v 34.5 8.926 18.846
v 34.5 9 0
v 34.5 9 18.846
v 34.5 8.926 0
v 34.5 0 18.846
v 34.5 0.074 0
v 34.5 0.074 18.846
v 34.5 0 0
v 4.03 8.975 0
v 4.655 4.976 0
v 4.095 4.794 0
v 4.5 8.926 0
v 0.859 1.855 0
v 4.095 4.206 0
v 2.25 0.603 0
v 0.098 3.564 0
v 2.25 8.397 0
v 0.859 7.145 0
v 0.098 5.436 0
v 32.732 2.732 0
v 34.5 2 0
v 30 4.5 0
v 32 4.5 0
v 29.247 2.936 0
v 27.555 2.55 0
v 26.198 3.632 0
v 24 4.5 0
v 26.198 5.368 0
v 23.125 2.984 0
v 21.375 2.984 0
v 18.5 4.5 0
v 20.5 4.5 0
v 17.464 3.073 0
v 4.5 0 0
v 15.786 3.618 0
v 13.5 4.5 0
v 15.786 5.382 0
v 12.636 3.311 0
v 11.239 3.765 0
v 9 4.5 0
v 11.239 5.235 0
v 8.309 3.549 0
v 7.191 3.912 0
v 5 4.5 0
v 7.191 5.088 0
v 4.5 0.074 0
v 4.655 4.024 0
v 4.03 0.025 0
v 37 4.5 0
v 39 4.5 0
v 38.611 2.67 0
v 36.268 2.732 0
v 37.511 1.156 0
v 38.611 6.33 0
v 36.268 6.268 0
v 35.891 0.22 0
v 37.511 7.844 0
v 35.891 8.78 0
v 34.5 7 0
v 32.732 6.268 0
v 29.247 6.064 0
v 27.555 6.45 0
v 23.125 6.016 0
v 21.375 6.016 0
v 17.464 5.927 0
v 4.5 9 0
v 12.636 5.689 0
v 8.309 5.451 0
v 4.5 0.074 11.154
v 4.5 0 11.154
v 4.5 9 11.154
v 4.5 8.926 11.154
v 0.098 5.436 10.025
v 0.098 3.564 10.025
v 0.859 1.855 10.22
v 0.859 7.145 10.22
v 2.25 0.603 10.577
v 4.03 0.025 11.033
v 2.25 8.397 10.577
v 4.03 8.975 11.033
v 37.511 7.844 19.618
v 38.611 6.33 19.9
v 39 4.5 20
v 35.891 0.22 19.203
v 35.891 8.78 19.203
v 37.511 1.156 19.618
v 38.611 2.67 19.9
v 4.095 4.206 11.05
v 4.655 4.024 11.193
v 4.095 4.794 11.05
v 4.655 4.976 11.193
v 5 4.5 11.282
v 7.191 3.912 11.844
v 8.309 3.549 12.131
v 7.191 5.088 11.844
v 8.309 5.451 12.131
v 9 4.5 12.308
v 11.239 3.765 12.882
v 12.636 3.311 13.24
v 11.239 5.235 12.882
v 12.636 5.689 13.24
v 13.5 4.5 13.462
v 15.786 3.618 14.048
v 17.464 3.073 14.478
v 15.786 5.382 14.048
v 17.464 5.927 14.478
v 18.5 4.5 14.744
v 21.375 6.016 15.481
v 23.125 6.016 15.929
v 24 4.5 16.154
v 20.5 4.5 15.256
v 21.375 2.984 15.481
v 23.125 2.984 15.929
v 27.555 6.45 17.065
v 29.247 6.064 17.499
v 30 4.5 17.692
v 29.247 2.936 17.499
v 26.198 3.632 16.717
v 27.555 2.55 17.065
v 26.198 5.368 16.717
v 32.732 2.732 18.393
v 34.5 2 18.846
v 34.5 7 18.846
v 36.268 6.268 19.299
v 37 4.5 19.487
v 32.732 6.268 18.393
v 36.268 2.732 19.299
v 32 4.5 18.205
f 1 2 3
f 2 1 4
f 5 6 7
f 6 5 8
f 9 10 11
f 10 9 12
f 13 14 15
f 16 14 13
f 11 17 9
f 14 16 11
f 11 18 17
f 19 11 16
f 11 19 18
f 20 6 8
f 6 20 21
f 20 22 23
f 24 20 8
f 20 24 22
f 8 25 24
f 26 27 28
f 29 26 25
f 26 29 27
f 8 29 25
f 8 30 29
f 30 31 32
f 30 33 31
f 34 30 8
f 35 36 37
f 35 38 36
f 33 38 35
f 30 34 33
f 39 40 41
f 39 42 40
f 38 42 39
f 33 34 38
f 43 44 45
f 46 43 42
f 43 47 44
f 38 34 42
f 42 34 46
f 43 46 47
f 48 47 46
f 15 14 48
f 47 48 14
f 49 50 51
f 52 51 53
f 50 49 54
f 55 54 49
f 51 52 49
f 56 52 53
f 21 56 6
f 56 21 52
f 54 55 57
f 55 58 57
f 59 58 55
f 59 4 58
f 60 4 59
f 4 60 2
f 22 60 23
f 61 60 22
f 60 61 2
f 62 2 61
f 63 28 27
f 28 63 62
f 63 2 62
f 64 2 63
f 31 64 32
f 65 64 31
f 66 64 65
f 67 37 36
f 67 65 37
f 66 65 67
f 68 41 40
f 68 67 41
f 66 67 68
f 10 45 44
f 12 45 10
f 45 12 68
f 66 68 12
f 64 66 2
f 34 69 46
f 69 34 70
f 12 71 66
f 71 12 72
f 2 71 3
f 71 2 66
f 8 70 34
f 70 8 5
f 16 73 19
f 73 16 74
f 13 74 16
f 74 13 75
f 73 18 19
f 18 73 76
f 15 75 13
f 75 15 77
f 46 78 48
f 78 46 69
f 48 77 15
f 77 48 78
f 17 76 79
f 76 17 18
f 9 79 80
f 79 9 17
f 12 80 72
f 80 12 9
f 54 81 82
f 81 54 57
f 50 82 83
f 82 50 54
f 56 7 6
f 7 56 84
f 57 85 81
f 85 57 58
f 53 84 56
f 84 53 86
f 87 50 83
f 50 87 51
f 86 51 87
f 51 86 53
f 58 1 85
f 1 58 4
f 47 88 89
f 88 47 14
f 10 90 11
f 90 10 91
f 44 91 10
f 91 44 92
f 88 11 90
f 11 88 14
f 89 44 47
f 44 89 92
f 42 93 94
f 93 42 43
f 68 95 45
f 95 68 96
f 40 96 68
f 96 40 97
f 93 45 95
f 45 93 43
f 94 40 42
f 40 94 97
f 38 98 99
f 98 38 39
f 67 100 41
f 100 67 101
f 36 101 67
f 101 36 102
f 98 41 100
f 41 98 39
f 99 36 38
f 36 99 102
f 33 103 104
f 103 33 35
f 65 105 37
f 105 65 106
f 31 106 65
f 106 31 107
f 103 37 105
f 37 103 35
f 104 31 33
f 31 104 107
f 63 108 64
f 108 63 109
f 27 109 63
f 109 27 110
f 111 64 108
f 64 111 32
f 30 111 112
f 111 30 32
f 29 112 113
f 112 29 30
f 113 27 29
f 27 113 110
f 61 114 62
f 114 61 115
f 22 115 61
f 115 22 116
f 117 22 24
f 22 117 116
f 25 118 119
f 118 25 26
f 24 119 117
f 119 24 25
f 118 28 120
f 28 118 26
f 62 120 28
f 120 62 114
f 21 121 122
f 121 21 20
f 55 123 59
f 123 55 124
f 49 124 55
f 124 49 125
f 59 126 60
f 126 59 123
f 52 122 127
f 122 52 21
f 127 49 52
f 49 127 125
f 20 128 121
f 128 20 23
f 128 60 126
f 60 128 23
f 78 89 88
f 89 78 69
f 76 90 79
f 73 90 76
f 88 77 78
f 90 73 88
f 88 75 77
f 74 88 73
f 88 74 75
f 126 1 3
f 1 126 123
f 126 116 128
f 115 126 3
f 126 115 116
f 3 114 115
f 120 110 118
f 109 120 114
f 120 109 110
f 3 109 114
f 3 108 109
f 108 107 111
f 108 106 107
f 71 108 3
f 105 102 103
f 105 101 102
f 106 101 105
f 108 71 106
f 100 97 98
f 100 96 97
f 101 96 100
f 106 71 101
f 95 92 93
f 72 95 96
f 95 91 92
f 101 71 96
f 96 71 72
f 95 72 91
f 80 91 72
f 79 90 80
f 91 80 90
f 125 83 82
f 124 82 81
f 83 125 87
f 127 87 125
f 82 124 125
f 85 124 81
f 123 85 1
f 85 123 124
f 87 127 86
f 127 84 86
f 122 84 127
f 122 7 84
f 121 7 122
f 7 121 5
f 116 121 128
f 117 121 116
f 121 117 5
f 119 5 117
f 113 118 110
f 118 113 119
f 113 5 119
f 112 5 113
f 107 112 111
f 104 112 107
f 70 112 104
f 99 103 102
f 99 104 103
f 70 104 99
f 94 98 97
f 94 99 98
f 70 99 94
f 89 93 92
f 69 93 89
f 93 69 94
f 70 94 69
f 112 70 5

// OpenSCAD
allen_diameters = [1,2,2.5,3,3.5,4,5];
spacing = 2;

total_width = max(allen_diameters) + 2 * spacing;

initial_spacing = (total_width - min(allen_diameters)) / 2;

total_spacing = initial_spacing + spacing * len(allen_diameters);

function sumv(v,i,s=0) = (i==s ? v[i] : v[i] + sumv(v,i-1,s));

total_length = total_spacing
    + sumv(allen_diameters, len(allen_diameters)-1);

start_height = 10;
final_height = 20;

module body() {
// create body
union() {
translate([total_width / 2,0,0])
cube([total_length - total_width, total_width, final_height]);

translate([total_width/2, total_width/2,0])
cylinder(final_height, d=total_width);

translate([total_length - total_width/2, total_width/2,0])
cylinder(final_height, d=total_width);
}
}

module holes() {
for (i = [0:len(allen_diameters)]) {
    // translate hole to proper location
    hole_x = initial_spacing + sumv(allen_diameters, i) + spacing * i - allen_diameters[i] / 2;
    hole_y = total_width / 2;
    translate([hole_x, hole_y, -0.5])
    // create hole
    cylinder(final_height + 1, d=allen_diameters[i]);
}
}

module top_slant() {
    
    translate([0,0,start_height])
    rotate([0, -atan2(final_height - start_height, total_length),0])
    translate([-0.5,-0.5,0])
    cube([total_length * 2, total_width + 1, final_height]);

}

difference() {
body();
holes();
top_slant();
}
